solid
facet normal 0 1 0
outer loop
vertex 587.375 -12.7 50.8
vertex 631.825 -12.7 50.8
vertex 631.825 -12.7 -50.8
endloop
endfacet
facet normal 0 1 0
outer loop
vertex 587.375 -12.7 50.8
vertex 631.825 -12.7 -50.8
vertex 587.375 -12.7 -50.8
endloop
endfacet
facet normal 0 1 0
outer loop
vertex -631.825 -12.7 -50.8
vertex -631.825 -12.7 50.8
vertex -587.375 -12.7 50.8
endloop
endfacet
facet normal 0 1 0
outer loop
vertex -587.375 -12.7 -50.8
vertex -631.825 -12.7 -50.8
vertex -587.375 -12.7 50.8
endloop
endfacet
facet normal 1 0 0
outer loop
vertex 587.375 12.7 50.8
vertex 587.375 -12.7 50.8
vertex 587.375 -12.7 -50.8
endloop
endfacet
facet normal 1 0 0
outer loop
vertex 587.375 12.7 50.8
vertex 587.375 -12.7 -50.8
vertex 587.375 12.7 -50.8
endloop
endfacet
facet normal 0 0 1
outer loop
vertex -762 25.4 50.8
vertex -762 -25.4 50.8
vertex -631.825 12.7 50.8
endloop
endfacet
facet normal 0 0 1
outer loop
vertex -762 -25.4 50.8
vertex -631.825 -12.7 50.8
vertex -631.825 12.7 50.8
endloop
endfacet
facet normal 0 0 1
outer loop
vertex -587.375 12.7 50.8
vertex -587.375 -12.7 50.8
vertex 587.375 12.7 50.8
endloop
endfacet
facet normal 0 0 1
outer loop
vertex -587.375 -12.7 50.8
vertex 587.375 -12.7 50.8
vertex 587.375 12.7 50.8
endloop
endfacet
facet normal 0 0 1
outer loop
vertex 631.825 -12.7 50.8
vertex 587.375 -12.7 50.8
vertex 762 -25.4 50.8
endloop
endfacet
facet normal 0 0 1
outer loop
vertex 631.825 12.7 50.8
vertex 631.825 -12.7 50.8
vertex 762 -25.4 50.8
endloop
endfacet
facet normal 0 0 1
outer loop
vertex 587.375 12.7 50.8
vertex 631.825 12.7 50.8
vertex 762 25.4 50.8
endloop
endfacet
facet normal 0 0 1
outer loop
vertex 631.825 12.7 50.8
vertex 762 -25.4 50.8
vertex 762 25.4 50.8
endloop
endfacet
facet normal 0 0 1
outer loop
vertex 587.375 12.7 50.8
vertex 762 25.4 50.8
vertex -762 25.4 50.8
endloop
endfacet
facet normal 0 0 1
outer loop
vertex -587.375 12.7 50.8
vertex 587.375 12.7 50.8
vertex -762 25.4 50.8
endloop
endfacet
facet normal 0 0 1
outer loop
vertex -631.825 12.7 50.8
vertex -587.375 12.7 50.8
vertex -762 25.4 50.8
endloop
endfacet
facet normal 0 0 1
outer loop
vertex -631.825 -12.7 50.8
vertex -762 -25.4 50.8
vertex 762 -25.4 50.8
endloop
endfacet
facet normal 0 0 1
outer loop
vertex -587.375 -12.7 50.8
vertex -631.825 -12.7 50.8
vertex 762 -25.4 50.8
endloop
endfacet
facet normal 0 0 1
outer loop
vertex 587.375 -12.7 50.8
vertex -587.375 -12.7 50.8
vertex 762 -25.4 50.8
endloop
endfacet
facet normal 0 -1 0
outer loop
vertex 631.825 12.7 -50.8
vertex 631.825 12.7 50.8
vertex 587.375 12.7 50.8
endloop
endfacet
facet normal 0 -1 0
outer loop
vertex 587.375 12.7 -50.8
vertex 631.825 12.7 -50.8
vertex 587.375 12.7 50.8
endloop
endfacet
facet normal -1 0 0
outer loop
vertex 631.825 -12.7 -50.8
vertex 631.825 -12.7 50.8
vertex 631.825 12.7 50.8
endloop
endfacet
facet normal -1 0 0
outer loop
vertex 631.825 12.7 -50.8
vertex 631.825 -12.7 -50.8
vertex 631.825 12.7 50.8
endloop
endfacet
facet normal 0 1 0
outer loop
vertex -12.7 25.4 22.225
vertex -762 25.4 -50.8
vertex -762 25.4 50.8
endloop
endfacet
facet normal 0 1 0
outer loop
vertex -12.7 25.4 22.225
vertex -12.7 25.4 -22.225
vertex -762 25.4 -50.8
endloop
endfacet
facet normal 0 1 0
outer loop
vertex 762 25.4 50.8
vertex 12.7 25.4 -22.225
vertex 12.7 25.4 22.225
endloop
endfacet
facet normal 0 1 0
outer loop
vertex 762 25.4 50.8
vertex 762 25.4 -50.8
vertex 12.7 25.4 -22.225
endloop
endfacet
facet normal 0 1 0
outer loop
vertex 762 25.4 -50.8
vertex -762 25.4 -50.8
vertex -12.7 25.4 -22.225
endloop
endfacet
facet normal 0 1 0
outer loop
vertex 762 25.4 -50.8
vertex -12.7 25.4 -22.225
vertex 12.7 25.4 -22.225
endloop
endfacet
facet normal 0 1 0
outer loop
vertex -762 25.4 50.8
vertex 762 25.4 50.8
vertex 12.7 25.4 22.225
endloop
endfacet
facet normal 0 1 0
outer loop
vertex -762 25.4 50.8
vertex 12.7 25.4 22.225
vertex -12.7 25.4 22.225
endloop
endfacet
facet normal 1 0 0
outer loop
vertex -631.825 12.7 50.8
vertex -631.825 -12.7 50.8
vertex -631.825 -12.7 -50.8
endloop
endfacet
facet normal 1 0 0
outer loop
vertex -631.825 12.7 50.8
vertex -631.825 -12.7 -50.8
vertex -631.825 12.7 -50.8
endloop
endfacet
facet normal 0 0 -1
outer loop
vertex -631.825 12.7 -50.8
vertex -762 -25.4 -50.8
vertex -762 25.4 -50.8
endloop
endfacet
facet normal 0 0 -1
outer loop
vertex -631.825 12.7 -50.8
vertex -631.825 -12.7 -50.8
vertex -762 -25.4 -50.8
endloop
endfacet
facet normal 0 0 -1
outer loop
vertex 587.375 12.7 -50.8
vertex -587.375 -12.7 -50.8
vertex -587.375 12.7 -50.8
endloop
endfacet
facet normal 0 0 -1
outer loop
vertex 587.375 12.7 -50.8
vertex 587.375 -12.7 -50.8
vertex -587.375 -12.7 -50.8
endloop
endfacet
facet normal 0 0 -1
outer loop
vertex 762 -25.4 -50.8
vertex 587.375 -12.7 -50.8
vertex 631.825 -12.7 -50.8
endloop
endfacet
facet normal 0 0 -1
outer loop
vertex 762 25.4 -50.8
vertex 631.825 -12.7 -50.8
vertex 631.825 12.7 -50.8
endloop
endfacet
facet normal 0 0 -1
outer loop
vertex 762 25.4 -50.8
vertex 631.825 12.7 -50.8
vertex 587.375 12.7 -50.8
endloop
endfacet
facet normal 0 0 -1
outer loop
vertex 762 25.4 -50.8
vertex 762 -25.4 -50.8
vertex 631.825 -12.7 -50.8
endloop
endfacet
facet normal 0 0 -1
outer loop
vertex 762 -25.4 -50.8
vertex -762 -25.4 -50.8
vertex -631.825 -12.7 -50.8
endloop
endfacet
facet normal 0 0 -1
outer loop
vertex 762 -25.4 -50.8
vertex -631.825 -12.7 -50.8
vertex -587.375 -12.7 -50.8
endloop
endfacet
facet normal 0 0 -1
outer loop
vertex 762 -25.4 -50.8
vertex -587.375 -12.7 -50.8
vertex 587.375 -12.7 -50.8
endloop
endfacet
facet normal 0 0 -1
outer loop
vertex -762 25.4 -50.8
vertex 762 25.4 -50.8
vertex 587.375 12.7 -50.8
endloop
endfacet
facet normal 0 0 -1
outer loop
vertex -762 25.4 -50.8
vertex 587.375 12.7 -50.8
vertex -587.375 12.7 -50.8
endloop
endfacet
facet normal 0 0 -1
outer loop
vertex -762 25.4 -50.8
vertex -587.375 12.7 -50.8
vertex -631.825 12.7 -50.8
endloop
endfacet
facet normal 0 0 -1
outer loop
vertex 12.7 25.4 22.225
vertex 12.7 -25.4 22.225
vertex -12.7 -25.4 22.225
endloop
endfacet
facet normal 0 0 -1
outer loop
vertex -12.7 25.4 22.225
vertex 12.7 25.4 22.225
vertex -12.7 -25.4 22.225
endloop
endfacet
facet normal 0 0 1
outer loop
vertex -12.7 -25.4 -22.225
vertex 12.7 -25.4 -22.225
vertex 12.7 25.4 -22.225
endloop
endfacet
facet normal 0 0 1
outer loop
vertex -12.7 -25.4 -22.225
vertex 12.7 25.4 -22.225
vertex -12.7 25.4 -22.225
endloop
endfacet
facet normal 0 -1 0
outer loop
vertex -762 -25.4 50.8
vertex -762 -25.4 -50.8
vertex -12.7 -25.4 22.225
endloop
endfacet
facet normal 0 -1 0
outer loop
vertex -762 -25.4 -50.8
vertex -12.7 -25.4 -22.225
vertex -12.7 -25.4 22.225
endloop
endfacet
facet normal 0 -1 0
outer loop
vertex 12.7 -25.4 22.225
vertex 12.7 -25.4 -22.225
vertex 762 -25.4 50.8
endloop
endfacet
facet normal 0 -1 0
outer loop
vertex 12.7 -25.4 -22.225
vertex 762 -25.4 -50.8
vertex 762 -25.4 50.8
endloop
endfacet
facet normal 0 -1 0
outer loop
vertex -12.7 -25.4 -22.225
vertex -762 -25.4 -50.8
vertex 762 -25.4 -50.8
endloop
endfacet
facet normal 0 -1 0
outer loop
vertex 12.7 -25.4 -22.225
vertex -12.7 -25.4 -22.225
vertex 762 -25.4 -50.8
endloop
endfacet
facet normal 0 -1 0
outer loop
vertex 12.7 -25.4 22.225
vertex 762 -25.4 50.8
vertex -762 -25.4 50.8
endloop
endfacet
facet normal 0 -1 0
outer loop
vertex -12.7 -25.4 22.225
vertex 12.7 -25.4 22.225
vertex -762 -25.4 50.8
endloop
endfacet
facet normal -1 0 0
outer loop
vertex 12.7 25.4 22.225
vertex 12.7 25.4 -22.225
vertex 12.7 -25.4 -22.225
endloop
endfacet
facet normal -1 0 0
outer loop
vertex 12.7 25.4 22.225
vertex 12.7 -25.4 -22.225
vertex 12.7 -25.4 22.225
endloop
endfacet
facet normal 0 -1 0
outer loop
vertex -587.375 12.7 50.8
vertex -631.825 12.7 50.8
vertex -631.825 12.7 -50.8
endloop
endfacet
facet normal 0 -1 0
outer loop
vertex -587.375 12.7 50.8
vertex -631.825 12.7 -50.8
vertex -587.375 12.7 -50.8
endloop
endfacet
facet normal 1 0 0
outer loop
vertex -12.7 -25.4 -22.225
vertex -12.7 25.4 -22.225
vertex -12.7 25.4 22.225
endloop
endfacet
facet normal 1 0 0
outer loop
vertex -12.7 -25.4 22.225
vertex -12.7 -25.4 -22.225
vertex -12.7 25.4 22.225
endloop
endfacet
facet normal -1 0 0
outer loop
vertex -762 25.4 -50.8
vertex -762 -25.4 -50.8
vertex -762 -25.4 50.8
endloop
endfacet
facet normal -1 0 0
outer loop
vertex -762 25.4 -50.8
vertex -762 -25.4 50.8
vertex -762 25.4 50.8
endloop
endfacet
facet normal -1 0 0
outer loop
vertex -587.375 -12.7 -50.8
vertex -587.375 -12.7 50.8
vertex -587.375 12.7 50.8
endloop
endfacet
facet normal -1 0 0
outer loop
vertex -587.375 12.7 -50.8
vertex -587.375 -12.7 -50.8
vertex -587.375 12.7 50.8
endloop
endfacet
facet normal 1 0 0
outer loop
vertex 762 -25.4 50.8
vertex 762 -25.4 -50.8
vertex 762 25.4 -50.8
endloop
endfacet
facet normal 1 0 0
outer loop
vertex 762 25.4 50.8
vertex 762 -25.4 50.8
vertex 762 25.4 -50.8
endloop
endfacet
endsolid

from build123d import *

# Parameters (mm, degrees)
F0_W     = 50.8
F0_H     = 101.6
F1_DEPTH = 762
F2_W     = 25.4
F2_H     = 44.45
F3_DEPTH = 50.801
F4_W     = 44.45
F4_H     = 25.4
F5_DEPTH = 101.601


# Not quite as in the source:
# - a pattern or mirror of a feature is missing from the dataset's text; its kind, count and spacing are read off the source's solid


with BuildPart() as f1:
    # F0 (on Right) → F1 (new body, symmetric)
    with BuildSketch(Plane.YZ):
        Rectangle(F0_W, F0_H)
    extrude(amount=F1_DEPTH, both=True)

    # F2 (on face) → F3 (cut, through all)
    with BuildSketch(Plane(origin=(0, 25.4, 0), x_dir=(-1, 0, 0), z_dir=(0, 1, 0))):
        Rectangle(F2_W, F2_H)
    extrude(amount=-F3_DEPTH, mode=Mode.SUBTRACT)

    # F4 (on face) → F5 (cut, through all)
    with BuildSketch(Plane.XY.offset(50.8)):
        with Locations((-609.6, 0)):
            Rectangle(F4_W, F4_H)
    f5 = extrude(amount=-F5_DEPTH, mode=Mode.SUBTRACT)

    # F5_copies: F5 across plane
    add(f5.mirror(Plane(origin=(0, 0, 0), x_dir=(0, 0, 1), z_dir=(1, 0, 0))), mode=Mode.SUBTRACT)


solid = f1.part
